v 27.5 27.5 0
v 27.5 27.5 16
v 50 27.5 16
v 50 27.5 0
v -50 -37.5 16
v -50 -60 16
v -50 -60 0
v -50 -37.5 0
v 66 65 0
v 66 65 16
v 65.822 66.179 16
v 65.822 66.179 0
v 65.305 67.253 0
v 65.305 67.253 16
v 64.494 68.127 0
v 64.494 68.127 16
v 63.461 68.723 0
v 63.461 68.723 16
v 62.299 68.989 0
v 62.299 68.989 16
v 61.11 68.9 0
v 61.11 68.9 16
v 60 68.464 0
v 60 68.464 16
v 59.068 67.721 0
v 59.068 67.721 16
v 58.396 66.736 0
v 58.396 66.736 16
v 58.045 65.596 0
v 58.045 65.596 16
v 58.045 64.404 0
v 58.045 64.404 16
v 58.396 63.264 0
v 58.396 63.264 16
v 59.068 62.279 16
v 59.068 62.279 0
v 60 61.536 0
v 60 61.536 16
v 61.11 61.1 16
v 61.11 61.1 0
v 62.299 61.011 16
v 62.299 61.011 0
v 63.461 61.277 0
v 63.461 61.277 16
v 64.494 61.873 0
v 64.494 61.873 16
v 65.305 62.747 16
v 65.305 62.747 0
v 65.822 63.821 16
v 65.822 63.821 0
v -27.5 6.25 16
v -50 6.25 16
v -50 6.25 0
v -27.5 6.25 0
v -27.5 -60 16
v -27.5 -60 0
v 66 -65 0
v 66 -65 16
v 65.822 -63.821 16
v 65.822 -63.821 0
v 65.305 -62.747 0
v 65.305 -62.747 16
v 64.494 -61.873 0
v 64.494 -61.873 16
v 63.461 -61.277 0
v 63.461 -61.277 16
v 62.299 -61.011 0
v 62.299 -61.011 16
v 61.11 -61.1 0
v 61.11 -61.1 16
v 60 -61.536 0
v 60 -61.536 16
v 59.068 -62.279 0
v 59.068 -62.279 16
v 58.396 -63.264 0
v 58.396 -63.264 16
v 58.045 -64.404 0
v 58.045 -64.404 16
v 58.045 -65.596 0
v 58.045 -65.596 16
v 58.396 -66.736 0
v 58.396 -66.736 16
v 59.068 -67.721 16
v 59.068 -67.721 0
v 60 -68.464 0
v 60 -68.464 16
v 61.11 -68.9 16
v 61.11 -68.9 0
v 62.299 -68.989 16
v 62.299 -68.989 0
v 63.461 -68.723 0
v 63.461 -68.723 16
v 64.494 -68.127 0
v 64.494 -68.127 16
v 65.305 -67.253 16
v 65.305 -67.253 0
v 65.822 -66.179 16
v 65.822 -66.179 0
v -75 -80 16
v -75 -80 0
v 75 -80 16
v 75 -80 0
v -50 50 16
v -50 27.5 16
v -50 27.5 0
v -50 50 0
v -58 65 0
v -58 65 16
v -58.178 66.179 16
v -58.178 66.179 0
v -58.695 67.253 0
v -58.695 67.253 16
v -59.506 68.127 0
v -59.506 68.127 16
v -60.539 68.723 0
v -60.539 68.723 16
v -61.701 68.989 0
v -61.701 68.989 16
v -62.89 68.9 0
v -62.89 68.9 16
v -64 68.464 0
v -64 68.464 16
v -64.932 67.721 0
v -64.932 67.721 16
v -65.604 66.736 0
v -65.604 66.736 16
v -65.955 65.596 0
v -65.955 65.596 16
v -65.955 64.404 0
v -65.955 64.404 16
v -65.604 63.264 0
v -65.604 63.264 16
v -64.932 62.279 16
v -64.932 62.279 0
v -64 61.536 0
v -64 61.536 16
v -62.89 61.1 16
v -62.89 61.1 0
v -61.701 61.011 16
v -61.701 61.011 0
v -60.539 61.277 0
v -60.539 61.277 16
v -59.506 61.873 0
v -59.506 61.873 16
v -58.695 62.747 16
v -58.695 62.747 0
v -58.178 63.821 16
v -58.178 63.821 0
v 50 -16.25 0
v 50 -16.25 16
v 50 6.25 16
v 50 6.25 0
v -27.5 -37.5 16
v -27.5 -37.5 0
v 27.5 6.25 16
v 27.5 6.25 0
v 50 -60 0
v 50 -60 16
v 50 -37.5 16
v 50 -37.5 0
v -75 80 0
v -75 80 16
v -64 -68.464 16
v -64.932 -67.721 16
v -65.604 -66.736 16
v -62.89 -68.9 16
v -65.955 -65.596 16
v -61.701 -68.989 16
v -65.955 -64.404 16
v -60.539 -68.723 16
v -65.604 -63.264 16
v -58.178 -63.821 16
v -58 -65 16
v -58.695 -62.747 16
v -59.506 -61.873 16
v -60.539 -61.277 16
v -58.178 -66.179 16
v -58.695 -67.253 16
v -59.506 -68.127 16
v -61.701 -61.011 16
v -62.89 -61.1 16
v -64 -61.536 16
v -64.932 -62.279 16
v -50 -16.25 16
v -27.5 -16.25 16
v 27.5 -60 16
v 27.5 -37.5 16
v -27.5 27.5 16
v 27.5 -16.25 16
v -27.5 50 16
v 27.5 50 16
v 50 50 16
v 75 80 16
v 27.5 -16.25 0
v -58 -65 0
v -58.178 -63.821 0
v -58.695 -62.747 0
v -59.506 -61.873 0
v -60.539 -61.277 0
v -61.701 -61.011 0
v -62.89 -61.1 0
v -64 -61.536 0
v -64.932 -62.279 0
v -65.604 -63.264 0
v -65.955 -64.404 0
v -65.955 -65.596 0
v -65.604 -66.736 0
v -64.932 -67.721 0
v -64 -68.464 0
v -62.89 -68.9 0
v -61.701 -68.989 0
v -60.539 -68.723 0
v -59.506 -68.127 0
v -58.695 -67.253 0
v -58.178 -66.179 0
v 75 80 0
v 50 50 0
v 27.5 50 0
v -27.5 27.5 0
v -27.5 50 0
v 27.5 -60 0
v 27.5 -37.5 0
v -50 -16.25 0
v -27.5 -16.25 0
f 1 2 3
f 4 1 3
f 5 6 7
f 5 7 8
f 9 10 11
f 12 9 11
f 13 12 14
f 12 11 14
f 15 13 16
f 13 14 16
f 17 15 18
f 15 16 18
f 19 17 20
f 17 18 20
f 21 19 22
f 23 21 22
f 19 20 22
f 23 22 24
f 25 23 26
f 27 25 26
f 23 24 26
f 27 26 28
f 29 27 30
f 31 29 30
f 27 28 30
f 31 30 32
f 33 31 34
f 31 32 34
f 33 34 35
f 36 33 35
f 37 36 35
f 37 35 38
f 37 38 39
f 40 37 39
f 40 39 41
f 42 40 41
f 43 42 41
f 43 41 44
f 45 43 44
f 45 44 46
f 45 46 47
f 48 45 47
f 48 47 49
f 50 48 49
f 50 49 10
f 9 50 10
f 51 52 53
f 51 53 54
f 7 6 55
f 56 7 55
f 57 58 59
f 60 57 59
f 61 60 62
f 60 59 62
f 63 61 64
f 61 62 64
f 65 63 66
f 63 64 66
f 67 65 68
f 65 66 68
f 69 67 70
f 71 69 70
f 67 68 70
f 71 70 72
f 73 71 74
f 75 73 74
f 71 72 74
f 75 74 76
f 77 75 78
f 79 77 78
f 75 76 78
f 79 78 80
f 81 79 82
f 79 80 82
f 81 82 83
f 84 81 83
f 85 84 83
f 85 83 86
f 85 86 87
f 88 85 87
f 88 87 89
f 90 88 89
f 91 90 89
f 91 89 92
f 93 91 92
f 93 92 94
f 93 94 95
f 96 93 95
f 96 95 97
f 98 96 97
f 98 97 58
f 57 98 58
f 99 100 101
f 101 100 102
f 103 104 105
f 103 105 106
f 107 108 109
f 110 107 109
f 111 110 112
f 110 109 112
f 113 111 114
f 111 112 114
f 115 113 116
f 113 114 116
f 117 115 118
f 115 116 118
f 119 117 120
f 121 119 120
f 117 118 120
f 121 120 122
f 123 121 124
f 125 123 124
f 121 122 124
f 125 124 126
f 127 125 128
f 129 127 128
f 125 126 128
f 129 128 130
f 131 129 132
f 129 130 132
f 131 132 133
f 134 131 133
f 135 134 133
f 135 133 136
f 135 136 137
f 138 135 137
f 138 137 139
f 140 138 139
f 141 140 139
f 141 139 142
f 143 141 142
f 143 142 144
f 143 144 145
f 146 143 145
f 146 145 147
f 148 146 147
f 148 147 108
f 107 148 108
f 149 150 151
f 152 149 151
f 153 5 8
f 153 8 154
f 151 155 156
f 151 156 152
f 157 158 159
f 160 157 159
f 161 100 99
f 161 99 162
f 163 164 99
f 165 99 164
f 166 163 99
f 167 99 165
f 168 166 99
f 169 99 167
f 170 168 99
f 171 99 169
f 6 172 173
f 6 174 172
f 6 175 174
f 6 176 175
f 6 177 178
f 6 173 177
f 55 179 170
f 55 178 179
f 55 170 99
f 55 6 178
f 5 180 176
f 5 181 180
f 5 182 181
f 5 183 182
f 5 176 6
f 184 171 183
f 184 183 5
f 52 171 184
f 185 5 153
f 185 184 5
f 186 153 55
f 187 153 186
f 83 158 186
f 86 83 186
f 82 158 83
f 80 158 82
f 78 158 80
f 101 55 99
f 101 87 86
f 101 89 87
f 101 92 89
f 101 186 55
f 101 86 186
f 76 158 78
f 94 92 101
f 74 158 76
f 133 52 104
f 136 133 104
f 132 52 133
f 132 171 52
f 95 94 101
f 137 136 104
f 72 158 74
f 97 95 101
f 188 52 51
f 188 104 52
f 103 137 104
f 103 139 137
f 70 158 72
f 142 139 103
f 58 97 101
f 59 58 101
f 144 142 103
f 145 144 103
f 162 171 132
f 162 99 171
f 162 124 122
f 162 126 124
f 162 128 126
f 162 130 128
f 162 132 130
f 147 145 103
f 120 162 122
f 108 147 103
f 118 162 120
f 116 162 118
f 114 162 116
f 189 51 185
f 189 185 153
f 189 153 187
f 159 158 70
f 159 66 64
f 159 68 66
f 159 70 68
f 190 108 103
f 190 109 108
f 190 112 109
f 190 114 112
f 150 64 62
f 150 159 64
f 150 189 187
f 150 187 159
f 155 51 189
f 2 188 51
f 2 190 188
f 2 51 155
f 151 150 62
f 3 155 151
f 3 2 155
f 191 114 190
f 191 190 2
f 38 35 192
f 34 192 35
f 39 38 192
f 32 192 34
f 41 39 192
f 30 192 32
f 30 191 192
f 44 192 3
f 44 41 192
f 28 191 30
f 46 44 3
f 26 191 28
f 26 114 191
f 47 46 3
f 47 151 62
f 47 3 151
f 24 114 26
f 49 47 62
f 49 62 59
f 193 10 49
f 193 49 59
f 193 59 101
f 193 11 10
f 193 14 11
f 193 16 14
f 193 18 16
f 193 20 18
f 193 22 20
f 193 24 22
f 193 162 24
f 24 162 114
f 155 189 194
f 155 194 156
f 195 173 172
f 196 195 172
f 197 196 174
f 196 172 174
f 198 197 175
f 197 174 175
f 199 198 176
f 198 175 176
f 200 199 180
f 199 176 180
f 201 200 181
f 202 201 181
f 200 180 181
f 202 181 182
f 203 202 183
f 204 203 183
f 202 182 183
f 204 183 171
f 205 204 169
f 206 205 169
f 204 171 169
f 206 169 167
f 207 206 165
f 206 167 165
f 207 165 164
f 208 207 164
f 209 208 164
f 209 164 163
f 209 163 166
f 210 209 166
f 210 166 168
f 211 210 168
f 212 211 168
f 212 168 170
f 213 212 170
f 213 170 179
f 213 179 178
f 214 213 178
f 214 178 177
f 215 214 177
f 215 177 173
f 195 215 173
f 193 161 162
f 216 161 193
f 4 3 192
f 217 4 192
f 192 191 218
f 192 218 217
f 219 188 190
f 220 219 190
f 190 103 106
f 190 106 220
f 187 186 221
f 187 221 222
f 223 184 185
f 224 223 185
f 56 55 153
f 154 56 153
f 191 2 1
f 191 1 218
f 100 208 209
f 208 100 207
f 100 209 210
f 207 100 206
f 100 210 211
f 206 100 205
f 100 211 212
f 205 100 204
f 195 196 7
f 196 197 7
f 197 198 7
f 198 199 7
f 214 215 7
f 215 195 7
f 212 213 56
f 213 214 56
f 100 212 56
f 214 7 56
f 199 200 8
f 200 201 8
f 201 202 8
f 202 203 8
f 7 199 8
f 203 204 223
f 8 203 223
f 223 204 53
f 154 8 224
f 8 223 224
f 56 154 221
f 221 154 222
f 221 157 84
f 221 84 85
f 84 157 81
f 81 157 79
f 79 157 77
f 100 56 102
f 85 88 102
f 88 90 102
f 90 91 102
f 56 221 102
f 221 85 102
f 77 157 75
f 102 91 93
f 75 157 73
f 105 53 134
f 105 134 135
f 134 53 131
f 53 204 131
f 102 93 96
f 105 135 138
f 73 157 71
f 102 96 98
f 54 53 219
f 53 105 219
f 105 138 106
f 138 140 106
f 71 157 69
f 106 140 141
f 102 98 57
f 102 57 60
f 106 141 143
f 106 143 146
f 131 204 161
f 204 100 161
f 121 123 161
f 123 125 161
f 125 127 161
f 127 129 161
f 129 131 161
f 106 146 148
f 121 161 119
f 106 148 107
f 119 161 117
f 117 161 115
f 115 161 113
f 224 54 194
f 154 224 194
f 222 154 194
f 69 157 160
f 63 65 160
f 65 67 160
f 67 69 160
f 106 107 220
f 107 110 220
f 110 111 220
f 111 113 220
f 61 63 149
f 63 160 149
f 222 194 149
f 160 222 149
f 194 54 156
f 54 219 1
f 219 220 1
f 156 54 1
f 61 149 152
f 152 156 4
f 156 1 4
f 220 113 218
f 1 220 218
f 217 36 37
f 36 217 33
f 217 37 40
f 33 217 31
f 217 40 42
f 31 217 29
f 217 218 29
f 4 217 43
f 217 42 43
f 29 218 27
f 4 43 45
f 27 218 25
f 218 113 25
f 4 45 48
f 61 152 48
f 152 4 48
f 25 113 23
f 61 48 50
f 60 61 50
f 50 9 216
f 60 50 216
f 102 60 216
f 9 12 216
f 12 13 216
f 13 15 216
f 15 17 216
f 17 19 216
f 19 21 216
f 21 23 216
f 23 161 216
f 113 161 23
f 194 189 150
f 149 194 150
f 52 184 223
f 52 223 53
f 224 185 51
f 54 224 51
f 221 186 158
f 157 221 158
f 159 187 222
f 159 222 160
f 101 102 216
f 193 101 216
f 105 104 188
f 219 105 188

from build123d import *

# Parameters (mm, degrees)
SKETCH1_W           = 150
SKETCH1_H           = 160
BOSS_EXTRUDE1_DEPTH = 16
SKETCH4_R           = 4
SKETCH4_W           = 22.5
SKETCH4_H           = 22.5
CUT_EXTRUDE1_DEPTH  = 17


with BuildPart() as part:
    # Sketch1 → Boss-Extrude1 (new body)
    with BuildSketch(Plane.XY):
        Rectangle(SKETCH1_W, SKETCH1_H)
    extrude(amount=BOSS_EXTRUDE1_DEPTH)

    # Sketch4 → Cut-Extrude1 (cut, through all)
    with BuildSketch(Plane.XY.offset(16)):
        with Locations((-62, 65)):
            Circle(SKETCH4_R)
        with Locations((62, 65)):
            Circle(SKETCH4_R)
        with Locations((62, -65)):
            Circle(SKETCH4_R)
        with Locations((-62, -65)):
            Circle(SKETCH4_R)
        with Locations((-38.75, 38.75)):
            Rectangle(SKETCH4_W, SKETCH4_H)
        with Locations((38.75, 38.75)):
            Rectangle(SKETCH4_W, SKETCH4_H)
        with Locations((-38.75, -48.75)):
            Rectangle(SKETCH4_W, SKETCH4_H)
        with Locations((38.75, -48.75)):
            Rectangle(SKETCH4_W, SKETCH4_H)
        with Locations((-38.75, -5)):
            Rectangle(SKETCH4_W, SKETCH4_H)
        with Locations((38.75, -5)):
            Rectangle(SKETCH4_W, SKETCH4_H)
    extrude(amount=-CUT_EXTRUDE1_DEPTH, mode=Mode.SUBTRACT)


solid = part.part
